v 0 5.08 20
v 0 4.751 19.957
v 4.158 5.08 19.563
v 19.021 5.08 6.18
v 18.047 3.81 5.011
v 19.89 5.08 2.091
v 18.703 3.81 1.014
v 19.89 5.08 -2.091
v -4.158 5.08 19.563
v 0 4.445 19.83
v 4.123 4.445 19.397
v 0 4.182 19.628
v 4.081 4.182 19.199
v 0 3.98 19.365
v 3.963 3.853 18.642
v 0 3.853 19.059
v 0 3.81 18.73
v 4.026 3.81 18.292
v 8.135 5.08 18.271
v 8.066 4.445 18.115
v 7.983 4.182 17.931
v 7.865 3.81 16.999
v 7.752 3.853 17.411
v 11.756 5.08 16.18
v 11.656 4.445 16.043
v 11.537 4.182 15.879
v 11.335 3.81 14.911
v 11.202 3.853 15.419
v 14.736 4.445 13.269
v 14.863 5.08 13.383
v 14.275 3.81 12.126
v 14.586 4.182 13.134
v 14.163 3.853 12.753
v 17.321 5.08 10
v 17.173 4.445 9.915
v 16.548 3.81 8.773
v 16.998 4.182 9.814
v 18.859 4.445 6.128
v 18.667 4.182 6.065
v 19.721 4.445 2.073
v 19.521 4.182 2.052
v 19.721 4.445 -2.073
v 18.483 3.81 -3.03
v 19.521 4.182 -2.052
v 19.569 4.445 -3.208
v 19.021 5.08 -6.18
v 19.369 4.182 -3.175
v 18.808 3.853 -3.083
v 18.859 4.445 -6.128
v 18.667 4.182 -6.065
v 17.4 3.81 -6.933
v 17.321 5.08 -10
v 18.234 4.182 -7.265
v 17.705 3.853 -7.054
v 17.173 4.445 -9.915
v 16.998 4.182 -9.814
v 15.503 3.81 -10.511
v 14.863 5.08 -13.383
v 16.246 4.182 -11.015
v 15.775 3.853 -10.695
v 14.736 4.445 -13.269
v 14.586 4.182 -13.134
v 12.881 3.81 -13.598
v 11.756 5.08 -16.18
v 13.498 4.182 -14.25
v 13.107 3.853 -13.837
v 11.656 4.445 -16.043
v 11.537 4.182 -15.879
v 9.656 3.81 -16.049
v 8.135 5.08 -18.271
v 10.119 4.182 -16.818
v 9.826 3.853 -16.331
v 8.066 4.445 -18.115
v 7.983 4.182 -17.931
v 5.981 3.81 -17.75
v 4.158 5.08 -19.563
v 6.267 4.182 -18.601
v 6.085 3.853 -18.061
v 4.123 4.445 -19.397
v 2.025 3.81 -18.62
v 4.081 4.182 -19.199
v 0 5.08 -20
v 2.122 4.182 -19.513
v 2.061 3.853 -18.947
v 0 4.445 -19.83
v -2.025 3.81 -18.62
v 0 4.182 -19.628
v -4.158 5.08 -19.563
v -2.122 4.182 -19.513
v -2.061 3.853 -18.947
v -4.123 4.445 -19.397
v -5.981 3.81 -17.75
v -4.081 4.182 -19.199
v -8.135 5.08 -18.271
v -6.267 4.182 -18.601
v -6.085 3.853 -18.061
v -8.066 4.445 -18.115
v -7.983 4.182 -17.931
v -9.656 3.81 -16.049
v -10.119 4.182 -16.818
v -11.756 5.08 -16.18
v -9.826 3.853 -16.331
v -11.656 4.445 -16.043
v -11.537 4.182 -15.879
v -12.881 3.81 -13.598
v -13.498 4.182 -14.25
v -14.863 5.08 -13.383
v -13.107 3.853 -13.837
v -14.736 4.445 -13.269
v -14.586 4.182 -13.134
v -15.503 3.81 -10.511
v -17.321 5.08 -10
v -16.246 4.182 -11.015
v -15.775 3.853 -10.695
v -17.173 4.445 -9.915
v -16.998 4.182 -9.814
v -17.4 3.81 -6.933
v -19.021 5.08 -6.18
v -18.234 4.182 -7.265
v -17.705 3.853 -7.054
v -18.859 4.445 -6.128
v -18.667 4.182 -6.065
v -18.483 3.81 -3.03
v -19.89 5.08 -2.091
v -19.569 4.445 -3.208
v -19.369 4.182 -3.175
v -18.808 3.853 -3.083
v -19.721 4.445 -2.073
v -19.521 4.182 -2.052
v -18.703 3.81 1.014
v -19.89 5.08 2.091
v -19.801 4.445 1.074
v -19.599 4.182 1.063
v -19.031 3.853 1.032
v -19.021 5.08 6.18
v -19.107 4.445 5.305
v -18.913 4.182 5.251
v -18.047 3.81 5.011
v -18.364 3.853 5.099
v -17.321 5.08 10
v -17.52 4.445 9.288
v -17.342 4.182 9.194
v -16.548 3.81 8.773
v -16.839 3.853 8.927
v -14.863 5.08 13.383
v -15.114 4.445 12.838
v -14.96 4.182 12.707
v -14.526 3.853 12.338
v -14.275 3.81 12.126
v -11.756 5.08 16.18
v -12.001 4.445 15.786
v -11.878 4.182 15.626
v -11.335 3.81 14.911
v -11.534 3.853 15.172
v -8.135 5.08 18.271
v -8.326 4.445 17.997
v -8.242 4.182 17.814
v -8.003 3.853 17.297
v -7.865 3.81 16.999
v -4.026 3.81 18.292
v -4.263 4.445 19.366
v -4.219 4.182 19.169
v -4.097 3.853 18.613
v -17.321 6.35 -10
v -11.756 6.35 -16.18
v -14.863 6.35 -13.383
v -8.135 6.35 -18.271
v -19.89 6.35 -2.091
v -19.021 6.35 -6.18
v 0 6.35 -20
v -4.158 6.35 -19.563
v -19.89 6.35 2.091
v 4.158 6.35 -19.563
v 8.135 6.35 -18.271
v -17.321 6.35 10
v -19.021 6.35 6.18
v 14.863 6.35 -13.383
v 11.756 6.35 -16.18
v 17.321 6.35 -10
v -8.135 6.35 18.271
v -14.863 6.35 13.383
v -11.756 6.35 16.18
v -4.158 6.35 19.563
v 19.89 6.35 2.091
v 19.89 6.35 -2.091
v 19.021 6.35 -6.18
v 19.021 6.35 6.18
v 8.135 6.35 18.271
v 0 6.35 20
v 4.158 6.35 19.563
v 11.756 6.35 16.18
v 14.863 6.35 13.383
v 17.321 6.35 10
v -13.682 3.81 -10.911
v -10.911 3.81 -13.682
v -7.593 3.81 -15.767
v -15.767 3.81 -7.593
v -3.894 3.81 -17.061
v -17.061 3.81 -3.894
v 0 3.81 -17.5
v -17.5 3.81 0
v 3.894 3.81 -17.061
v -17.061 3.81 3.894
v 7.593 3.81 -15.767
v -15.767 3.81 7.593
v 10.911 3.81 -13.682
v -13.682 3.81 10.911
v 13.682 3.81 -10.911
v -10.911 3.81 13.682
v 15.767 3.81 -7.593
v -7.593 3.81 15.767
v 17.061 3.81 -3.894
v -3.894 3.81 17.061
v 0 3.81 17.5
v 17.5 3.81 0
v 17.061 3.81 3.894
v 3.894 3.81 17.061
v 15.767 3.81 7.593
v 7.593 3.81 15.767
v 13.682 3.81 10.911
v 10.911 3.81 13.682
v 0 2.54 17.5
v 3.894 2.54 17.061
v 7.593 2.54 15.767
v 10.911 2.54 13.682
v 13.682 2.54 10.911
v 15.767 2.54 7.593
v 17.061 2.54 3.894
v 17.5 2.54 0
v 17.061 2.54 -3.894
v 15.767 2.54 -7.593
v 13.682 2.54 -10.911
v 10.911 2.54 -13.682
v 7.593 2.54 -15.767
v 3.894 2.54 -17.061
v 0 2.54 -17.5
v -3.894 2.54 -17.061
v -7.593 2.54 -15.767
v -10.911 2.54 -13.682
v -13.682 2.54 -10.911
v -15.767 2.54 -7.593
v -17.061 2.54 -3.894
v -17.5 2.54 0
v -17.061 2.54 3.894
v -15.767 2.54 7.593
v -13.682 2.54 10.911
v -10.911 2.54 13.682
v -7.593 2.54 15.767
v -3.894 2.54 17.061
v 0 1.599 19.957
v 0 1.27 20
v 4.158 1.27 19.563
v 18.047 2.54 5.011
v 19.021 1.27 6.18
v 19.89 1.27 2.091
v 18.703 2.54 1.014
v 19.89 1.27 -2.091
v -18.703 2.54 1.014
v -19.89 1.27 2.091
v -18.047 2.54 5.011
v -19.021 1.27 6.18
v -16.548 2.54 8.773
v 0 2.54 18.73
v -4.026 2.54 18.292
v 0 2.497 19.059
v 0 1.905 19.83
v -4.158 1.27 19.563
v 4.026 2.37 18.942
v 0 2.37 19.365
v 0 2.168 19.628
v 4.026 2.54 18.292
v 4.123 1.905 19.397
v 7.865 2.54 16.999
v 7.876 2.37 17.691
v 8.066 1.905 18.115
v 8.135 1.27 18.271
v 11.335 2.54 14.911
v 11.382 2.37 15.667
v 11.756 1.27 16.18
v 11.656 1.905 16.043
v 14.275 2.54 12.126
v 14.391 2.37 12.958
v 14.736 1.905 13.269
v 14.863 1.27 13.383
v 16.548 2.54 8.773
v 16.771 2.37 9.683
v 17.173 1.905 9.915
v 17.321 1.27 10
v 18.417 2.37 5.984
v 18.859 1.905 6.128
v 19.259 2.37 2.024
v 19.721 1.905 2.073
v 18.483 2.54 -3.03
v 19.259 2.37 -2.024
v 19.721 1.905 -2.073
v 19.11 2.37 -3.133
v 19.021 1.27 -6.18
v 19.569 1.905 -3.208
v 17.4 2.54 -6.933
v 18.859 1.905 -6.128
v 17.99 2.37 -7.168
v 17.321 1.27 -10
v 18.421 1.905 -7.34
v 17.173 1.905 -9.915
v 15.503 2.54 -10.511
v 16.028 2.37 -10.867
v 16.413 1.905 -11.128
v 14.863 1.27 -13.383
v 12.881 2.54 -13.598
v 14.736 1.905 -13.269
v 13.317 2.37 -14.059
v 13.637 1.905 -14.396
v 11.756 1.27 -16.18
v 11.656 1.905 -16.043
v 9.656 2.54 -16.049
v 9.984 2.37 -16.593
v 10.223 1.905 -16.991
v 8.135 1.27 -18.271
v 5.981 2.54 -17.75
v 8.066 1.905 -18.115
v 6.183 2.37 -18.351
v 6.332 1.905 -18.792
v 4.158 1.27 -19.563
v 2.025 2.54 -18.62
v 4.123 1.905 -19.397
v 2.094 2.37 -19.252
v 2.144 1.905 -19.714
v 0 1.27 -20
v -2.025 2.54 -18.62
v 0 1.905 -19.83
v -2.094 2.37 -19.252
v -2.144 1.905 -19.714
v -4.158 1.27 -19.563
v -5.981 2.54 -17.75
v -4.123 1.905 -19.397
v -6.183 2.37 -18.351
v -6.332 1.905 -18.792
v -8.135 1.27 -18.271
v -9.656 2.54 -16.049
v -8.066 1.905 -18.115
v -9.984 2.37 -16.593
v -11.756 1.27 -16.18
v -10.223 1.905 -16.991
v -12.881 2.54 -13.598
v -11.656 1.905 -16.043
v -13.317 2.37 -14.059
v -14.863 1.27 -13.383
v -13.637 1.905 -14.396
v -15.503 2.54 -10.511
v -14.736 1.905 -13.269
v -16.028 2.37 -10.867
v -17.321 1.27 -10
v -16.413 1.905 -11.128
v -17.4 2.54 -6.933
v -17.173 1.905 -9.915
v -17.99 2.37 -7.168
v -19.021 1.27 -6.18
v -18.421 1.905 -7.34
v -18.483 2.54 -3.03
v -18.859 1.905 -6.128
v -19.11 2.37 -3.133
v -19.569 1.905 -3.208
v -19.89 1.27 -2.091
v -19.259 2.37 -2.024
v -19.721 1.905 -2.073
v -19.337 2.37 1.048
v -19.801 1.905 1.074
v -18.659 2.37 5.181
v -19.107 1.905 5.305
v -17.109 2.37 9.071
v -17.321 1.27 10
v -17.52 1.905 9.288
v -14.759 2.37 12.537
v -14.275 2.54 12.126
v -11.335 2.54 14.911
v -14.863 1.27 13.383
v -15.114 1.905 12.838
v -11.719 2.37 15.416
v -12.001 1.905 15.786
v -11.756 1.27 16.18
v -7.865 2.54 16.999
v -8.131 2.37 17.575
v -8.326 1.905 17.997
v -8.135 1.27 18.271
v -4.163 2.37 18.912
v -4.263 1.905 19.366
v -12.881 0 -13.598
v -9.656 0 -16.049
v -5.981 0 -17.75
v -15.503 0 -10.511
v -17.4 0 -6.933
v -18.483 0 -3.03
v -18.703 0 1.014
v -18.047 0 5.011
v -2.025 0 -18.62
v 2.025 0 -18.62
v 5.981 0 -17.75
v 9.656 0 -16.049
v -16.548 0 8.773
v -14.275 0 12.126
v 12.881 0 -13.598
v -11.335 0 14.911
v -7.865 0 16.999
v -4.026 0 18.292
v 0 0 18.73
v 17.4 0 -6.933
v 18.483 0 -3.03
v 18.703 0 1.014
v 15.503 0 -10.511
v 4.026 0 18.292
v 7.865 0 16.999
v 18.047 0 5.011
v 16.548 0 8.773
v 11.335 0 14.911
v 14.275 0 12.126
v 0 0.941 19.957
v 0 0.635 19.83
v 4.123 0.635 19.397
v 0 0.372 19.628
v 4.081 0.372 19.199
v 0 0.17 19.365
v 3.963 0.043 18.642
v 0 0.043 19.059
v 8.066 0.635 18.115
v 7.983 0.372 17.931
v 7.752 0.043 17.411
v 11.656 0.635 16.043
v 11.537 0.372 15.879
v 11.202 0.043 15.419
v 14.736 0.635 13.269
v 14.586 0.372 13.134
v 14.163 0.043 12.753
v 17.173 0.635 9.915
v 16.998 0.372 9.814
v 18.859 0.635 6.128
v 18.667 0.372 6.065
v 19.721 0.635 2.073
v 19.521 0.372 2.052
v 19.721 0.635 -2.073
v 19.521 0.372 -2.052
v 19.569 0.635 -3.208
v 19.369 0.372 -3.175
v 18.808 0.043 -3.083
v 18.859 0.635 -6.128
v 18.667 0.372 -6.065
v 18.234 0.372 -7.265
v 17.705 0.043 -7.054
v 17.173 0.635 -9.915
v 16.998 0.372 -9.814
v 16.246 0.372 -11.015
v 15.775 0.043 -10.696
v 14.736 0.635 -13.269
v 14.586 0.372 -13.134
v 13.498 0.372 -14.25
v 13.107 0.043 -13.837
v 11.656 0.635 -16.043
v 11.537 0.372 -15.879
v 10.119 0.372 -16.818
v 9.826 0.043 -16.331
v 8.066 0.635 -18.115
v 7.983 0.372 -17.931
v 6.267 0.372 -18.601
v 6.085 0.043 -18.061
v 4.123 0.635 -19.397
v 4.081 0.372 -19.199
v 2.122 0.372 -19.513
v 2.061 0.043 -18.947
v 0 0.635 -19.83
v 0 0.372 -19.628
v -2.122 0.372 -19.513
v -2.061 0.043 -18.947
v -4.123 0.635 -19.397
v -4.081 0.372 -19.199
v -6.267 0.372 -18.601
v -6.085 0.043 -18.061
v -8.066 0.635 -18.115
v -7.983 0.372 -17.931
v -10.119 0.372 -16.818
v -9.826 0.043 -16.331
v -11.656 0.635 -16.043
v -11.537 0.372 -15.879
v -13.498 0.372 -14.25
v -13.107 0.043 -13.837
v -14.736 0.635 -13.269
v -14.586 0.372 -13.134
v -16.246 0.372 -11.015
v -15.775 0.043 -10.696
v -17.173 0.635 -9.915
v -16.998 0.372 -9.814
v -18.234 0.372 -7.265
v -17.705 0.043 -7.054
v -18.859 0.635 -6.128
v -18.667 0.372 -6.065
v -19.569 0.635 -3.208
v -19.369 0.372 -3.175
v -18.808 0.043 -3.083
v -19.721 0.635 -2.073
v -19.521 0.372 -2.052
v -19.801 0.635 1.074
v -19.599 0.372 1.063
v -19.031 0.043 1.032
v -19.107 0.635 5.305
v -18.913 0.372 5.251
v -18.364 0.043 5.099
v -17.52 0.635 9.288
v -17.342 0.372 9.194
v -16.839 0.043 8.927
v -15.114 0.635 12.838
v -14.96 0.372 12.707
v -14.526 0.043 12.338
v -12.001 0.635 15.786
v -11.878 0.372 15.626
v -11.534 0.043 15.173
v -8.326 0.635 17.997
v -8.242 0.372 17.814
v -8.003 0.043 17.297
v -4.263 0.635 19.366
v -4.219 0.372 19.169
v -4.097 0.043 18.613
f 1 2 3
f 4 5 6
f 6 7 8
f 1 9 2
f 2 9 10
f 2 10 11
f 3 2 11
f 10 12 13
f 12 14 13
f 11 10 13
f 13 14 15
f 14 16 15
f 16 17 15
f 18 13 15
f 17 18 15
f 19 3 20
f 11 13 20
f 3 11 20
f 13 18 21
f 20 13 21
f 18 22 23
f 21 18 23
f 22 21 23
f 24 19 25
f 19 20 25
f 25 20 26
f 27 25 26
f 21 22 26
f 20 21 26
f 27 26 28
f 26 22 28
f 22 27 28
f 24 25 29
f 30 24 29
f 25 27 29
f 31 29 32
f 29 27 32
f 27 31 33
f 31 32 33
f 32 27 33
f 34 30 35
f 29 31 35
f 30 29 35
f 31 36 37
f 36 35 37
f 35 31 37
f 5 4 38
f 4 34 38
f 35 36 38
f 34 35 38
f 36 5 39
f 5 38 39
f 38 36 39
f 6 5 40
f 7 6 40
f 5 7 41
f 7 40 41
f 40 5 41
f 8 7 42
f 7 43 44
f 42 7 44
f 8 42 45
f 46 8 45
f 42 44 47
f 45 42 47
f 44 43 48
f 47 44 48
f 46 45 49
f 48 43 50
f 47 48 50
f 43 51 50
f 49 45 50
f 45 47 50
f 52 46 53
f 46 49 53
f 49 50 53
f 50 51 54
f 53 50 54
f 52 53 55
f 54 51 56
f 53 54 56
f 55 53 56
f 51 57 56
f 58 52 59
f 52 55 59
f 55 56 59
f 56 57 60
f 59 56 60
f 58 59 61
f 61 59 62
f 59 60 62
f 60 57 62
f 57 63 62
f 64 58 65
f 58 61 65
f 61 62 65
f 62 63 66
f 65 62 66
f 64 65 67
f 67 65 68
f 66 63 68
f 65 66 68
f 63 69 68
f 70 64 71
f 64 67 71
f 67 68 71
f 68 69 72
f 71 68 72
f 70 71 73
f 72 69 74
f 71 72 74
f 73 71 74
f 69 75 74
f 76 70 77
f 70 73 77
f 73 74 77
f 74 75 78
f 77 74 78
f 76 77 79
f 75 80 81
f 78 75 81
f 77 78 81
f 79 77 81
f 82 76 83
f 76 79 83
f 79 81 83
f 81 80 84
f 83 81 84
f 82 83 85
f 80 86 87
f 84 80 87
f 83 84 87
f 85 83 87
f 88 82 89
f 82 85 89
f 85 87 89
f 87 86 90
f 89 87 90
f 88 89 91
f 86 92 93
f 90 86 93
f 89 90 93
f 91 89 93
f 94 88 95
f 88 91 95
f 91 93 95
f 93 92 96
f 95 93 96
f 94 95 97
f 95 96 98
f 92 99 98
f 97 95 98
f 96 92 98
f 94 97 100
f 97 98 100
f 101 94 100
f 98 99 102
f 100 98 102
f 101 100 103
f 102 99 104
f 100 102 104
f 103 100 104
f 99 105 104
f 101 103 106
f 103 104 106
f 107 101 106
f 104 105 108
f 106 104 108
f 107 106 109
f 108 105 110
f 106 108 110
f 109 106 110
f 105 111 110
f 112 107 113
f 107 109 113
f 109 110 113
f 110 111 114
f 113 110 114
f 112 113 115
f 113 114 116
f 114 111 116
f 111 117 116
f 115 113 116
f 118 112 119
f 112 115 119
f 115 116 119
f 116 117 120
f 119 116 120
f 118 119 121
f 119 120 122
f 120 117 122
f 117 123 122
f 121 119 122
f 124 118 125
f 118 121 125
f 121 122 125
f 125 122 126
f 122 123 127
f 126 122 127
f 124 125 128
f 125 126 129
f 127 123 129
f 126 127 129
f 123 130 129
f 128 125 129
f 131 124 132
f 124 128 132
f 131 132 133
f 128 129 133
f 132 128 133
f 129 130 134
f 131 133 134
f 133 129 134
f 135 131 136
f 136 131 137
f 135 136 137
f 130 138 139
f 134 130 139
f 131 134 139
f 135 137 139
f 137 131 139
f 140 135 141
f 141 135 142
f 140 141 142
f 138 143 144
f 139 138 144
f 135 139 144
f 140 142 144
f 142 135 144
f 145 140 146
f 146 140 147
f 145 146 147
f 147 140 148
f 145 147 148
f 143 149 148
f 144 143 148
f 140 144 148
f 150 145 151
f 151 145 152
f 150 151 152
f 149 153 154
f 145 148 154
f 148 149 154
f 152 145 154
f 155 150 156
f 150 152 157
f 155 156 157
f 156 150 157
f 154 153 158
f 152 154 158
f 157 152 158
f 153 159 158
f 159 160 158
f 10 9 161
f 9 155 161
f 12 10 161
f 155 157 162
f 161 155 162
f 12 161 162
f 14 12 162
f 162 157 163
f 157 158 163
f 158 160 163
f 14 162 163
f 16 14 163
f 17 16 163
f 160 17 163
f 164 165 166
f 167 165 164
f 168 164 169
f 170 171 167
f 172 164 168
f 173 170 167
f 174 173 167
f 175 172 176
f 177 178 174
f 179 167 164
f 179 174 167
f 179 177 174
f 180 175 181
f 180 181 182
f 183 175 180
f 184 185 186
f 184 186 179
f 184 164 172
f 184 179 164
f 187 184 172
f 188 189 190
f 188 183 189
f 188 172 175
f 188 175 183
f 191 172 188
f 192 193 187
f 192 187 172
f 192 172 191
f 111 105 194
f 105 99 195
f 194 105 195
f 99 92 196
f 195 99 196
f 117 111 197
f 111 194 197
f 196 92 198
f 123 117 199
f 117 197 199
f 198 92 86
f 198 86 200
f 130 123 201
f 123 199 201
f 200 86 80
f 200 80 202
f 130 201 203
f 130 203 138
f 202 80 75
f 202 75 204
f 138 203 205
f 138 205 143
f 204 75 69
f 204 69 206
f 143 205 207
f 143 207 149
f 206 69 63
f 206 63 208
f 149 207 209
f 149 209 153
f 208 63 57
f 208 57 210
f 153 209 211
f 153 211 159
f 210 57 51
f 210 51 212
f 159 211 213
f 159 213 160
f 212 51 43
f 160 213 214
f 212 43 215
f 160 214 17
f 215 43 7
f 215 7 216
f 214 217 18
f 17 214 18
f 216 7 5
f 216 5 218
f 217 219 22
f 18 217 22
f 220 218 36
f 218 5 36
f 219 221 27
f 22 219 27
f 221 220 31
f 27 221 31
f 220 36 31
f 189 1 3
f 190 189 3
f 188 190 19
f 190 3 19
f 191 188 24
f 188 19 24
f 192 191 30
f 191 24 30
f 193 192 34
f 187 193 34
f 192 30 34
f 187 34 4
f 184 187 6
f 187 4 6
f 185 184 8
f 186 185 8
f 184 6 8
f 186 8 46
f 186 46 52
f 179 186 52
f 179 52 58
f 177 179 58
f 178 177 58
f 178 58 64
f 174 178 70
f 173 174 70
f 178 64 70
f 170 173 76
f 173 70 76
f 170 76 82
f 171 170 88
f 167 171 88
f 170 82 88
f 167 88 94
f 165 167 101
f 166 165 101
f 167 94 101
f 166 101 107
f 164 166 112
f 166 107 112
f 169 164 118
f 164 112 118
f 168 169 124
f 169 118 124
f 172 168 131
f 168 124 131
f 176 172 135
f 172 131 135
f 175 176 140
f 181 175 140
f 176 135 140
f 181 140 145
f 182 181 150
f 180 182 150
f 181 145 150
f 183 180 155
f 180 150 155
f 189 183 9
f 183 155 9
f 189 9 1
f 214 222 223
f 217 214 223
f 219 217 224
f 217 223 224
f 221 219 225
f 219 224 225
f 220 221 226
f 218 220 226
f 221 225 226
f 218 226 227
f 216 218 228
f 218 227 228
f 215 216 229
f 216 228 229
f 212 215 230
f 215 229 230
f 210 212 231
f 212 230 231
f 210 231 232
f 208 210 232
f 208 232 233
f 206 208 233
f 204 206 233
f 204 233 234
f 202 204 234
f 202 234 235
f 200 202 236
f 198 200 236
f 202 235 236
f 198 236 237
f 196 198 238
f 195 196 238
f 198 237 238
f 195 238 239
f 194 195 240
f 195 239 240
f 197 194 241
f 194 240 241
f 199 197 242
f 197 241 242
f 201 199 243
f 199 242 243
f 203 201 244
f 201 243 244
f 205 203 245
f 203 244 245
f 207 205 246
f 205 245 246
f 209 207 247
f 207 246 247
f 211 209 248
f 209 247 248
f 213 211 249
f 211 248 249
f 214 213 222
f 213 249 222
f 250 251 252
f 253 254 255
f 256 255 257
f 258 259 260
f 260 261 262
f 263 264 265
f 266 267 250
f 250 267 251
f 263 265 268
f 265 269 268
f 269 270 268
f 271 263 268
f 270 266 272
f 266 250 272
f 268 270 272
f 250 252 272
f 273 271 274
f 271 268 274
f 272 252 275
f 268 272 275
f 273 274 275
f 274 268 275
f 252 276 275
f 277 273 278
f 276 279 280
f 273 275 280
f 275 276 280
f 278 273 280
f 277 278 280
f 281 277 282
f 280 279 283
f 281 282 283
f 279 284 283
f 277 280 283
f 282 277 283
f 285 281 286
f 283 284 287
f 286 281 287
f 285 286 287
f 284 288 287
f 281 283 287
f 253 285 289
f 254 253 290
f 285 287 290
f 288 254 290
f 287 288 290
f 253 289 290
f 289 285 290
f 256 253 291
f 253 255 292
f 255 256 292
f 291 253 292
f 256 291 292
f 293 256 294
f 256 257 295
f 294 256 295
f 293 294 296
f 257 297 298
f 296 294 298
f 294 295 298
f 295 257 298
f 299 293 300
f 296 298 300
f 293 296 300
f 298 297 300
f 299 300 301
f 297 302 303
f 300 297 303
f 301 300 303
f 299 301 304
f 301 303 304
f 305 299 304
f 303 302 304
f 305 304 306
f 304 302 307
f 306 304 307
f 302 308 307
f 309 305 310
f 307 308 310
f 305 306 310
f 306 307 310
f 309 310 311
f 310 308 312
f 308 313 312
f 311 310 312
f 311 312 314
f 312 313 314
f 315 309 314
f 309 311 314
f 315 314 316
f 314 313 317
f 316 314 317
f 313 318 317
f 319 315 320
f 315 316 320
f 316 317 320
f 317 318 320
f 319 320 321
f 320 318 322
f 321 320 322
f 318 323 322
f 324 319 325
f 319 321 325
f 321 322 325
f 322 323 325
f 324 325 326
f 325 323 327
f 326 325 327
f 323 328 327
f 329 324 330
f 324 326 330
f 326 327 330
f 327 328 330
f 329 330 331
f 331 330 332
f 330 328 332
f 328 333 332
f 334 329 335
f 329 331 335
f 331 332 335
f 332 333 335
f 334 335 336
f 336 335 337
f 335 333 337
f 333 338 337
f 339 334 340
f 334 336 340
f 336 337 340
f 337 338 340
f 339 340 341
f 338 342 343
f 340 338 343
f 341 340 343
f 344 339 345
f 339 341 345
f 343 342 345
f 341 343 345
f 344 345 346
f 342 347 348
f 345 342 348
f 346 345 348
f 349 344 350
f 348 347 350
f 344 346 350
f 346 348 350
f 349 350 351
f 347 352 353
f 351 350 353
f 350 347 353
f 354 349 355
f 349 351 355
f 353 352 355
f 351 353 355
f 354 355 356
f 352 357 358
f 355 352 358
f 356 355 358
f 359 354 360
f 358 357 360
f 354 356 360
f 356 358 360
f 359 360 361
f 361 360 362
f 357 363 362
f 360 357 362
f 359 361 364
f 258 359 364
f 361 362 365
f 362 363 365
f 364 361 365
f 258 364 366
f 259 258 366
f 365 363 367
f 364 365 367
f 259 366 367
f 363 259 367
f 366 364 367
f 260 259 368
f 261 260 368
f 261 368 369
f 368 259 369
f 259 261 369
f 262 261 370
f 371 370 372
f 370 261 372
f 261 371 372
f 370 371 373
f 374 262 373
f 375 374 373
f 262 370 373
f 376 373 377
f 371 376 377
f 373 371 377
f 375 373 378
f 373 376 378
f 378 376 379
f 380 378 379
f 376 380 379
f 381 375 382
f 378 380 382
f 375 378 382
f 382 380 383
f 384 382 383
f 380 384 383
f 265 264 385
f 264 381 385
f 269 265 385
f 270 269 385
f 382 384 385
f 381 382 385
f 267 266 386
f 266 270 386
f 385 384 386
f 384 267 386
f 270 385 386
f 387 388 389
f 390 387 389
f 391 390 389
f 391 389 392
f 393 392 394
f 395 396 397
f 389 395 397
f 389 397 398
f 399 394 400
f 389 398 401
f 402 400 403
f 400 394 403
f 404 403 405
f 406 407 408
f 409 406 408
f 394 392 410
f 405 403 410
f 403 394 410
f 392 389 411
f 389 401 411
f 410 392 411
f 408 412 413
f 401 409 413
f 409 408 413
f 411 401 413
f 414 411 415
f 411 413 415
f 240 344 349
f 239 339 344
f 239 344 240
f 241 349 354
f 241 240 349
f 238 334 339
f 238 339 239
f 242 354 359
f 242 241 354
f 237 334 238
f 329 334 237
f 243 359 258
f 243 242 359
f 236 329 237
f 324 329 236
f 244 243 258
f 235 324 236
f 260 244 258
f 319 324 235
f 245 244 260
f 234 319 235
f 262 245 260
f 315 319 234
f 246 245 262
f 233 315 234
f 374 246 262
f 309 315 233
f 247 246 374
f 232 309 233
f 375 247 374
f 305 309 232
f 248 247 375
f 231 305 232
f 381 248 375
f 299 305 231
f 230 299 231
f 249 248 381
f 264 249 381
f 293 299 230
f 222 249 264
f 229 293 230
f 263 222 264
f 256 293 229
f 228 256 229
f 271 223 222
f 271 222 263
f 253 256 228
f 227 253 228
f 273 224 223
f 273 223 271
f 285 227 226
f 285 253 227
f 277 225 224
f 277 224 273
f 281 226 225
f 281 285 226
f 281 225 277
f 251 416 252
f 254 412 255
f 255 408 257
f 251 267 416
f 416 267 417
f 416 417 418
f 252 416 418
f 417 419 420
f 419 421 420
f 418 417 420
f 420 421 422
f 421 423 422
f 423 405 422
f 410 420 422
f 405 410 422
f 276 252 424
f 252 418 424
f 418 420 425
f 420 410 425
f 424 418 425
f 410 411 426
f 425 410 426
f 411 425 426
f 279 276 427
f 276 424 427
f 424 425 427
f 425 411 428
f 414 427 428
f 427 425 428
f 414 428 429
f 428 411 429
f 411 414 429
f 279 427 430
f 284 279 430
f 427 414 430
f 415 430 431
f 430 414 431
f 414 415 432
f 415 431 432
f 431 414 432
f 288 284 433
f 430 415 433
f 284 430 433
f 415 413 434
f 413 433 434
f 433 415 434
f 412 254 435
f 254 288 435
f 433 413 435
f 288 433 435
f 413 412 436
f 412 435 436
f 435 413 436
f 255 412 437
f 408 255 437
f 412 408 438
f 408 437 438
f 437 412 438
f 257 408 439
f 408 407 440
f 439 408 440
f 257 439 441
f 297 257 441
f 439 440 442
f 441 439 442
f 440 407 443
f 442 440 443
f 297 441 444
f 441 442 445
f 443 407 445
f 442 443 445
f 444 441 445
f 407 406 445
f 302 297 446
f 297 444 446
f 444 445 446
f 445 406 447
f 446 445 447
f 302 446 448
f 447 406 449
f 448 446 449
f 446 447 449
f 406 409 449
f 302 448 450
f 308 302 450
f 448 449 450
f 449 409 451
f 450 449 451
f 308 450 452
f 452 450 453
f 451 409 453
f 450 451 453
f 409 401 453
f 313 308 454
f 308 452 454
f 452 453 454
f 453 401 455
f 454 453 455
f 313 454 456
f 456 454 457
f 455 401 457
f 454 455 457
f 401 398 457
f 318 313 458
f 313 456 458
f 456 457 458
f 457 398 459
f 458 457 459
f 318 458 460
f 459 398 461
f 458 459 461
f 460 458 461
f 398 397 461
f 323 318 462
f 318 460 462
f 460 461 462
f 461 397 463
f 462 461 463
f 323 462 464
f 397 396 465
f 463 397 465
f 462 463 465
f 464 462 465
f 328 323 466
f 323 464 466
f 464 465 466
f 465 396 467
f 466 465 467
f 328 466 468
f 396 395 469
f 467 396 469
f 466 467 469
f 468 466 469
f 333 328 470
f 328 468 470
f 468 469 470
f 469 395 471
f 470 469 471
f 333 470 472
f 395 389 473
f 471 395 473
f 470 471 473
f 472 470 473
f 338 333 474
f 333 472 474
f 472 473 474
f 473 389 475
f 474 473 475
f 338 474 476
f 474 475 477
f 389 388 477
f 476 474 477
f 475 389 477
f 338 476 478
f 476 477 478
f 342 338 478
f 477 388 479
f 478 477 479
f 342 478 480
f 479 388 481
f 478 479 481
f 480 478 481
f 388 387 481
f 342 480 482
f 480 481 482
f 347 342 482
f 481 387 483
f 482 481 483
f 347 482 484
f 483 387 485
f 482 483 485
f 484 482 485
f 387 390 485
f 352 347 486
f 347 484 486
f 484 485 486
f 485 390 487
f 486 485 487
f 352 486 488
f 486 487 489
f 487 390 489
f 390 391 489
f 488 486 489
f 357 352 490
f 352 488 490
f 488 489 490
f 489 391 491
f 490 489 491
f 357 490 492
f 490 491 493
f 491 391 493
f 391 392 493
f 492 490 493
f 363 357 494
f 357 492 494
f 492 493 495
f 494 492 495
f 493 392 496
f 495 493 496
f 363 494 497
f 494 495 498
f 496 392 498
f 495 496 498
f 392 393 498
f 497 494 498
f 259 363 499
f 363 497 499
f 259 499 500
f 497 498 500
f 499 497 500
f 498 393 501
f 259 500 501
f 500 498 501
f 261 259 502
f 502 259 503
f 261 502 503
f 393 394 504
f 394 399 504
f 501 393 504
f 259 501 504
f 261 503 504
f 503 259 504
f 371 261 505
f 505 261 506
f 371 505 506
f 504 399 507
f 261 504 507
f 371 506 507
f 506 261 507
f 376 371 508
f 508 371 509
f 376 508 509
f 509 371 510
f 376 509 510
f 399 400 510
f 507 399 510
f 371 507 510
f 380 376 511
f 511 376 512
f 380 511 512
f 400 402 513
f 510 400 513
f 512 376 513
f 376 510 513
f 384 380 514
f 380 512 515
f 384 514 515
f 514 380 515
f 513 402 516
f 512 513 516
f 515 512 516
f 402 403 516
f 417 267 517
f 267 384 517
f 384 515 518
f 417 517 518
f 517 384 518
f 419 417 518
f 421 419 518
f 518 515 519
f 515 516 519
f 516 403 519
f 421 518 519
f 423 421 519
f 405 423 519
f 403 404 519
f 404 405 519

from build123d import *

# Parameters (mm, degrees)
SKETCH1_R           = 20
BOSS_EXTRUDE1_DEPTH = 2.54
SKETCH2_R           = 17.5
BOSS_EXTRUDE2_DEPTH = 1.27
SKETCH3_R           = 20
BOSS_EXTRUDE3_DEPTH = 2.54
FILLET1_R           = 1.27
FILLET2_R           = 1.27


with BuildPart() as part:
    # Sketch1 → Boss-Extrude1 (new body)
    with BuildSketch(Plane(origin=(0, 0, 0), x_dir=(1, 0, 0), z_dir=(0, 1, 0))):
        with Locations(Location((0, 0, 0), (0, 0, 270))):
            Circle(SKETCH1_R)
    extrude(amount=BOSS_EXTRUDE1_DEPTH)

    # Sketch2 → Boss-Extrude2 (add)
    with BuildSketch(Plane(origin=(0, 2.54, 0), x_dir=(1, 0, 0), z_dir=(0, 1, 0))):
        with Locations(Location((0, 0, 0), (0, 0, 270))):
            Circle(SKETCH2_R)
    extrude(amount=BOSS_EXTRUDE2_DEPTH)

    # Sketch3 → Boss-Extrude3 (add)
    with BuildSketch(Plane(origin=(0, 3.81, 0), x_dir=(1, 0, 0), z_dir=(0, 1, 0))):
        with Locations(Location((0, 0, 0), (0, 0, 270))):
            Circle(SKETCH3_R)
    extrude(amount=BOSS_EXTRUDE3_DEPTH)

    # Fillet1
    fillet1_edges = [part.edges().sort_by_distance(p)[0] for p in [
        (0, 3.81, -20),
    ]]
    fillet(fillet1_edges, radius=FILLET1_R)

    # Fillet2
    fillet2_edges = [part.edges().sort_by_distance(p)[0] for p in [
        (0, 0, -20),
        (0, 2.54, -20),
    ]]
    fillet(fillet2_edges, radius=FILLET2_R - 0.0001)  # a hair under: the kernel refuses the full size


solid = part.part
